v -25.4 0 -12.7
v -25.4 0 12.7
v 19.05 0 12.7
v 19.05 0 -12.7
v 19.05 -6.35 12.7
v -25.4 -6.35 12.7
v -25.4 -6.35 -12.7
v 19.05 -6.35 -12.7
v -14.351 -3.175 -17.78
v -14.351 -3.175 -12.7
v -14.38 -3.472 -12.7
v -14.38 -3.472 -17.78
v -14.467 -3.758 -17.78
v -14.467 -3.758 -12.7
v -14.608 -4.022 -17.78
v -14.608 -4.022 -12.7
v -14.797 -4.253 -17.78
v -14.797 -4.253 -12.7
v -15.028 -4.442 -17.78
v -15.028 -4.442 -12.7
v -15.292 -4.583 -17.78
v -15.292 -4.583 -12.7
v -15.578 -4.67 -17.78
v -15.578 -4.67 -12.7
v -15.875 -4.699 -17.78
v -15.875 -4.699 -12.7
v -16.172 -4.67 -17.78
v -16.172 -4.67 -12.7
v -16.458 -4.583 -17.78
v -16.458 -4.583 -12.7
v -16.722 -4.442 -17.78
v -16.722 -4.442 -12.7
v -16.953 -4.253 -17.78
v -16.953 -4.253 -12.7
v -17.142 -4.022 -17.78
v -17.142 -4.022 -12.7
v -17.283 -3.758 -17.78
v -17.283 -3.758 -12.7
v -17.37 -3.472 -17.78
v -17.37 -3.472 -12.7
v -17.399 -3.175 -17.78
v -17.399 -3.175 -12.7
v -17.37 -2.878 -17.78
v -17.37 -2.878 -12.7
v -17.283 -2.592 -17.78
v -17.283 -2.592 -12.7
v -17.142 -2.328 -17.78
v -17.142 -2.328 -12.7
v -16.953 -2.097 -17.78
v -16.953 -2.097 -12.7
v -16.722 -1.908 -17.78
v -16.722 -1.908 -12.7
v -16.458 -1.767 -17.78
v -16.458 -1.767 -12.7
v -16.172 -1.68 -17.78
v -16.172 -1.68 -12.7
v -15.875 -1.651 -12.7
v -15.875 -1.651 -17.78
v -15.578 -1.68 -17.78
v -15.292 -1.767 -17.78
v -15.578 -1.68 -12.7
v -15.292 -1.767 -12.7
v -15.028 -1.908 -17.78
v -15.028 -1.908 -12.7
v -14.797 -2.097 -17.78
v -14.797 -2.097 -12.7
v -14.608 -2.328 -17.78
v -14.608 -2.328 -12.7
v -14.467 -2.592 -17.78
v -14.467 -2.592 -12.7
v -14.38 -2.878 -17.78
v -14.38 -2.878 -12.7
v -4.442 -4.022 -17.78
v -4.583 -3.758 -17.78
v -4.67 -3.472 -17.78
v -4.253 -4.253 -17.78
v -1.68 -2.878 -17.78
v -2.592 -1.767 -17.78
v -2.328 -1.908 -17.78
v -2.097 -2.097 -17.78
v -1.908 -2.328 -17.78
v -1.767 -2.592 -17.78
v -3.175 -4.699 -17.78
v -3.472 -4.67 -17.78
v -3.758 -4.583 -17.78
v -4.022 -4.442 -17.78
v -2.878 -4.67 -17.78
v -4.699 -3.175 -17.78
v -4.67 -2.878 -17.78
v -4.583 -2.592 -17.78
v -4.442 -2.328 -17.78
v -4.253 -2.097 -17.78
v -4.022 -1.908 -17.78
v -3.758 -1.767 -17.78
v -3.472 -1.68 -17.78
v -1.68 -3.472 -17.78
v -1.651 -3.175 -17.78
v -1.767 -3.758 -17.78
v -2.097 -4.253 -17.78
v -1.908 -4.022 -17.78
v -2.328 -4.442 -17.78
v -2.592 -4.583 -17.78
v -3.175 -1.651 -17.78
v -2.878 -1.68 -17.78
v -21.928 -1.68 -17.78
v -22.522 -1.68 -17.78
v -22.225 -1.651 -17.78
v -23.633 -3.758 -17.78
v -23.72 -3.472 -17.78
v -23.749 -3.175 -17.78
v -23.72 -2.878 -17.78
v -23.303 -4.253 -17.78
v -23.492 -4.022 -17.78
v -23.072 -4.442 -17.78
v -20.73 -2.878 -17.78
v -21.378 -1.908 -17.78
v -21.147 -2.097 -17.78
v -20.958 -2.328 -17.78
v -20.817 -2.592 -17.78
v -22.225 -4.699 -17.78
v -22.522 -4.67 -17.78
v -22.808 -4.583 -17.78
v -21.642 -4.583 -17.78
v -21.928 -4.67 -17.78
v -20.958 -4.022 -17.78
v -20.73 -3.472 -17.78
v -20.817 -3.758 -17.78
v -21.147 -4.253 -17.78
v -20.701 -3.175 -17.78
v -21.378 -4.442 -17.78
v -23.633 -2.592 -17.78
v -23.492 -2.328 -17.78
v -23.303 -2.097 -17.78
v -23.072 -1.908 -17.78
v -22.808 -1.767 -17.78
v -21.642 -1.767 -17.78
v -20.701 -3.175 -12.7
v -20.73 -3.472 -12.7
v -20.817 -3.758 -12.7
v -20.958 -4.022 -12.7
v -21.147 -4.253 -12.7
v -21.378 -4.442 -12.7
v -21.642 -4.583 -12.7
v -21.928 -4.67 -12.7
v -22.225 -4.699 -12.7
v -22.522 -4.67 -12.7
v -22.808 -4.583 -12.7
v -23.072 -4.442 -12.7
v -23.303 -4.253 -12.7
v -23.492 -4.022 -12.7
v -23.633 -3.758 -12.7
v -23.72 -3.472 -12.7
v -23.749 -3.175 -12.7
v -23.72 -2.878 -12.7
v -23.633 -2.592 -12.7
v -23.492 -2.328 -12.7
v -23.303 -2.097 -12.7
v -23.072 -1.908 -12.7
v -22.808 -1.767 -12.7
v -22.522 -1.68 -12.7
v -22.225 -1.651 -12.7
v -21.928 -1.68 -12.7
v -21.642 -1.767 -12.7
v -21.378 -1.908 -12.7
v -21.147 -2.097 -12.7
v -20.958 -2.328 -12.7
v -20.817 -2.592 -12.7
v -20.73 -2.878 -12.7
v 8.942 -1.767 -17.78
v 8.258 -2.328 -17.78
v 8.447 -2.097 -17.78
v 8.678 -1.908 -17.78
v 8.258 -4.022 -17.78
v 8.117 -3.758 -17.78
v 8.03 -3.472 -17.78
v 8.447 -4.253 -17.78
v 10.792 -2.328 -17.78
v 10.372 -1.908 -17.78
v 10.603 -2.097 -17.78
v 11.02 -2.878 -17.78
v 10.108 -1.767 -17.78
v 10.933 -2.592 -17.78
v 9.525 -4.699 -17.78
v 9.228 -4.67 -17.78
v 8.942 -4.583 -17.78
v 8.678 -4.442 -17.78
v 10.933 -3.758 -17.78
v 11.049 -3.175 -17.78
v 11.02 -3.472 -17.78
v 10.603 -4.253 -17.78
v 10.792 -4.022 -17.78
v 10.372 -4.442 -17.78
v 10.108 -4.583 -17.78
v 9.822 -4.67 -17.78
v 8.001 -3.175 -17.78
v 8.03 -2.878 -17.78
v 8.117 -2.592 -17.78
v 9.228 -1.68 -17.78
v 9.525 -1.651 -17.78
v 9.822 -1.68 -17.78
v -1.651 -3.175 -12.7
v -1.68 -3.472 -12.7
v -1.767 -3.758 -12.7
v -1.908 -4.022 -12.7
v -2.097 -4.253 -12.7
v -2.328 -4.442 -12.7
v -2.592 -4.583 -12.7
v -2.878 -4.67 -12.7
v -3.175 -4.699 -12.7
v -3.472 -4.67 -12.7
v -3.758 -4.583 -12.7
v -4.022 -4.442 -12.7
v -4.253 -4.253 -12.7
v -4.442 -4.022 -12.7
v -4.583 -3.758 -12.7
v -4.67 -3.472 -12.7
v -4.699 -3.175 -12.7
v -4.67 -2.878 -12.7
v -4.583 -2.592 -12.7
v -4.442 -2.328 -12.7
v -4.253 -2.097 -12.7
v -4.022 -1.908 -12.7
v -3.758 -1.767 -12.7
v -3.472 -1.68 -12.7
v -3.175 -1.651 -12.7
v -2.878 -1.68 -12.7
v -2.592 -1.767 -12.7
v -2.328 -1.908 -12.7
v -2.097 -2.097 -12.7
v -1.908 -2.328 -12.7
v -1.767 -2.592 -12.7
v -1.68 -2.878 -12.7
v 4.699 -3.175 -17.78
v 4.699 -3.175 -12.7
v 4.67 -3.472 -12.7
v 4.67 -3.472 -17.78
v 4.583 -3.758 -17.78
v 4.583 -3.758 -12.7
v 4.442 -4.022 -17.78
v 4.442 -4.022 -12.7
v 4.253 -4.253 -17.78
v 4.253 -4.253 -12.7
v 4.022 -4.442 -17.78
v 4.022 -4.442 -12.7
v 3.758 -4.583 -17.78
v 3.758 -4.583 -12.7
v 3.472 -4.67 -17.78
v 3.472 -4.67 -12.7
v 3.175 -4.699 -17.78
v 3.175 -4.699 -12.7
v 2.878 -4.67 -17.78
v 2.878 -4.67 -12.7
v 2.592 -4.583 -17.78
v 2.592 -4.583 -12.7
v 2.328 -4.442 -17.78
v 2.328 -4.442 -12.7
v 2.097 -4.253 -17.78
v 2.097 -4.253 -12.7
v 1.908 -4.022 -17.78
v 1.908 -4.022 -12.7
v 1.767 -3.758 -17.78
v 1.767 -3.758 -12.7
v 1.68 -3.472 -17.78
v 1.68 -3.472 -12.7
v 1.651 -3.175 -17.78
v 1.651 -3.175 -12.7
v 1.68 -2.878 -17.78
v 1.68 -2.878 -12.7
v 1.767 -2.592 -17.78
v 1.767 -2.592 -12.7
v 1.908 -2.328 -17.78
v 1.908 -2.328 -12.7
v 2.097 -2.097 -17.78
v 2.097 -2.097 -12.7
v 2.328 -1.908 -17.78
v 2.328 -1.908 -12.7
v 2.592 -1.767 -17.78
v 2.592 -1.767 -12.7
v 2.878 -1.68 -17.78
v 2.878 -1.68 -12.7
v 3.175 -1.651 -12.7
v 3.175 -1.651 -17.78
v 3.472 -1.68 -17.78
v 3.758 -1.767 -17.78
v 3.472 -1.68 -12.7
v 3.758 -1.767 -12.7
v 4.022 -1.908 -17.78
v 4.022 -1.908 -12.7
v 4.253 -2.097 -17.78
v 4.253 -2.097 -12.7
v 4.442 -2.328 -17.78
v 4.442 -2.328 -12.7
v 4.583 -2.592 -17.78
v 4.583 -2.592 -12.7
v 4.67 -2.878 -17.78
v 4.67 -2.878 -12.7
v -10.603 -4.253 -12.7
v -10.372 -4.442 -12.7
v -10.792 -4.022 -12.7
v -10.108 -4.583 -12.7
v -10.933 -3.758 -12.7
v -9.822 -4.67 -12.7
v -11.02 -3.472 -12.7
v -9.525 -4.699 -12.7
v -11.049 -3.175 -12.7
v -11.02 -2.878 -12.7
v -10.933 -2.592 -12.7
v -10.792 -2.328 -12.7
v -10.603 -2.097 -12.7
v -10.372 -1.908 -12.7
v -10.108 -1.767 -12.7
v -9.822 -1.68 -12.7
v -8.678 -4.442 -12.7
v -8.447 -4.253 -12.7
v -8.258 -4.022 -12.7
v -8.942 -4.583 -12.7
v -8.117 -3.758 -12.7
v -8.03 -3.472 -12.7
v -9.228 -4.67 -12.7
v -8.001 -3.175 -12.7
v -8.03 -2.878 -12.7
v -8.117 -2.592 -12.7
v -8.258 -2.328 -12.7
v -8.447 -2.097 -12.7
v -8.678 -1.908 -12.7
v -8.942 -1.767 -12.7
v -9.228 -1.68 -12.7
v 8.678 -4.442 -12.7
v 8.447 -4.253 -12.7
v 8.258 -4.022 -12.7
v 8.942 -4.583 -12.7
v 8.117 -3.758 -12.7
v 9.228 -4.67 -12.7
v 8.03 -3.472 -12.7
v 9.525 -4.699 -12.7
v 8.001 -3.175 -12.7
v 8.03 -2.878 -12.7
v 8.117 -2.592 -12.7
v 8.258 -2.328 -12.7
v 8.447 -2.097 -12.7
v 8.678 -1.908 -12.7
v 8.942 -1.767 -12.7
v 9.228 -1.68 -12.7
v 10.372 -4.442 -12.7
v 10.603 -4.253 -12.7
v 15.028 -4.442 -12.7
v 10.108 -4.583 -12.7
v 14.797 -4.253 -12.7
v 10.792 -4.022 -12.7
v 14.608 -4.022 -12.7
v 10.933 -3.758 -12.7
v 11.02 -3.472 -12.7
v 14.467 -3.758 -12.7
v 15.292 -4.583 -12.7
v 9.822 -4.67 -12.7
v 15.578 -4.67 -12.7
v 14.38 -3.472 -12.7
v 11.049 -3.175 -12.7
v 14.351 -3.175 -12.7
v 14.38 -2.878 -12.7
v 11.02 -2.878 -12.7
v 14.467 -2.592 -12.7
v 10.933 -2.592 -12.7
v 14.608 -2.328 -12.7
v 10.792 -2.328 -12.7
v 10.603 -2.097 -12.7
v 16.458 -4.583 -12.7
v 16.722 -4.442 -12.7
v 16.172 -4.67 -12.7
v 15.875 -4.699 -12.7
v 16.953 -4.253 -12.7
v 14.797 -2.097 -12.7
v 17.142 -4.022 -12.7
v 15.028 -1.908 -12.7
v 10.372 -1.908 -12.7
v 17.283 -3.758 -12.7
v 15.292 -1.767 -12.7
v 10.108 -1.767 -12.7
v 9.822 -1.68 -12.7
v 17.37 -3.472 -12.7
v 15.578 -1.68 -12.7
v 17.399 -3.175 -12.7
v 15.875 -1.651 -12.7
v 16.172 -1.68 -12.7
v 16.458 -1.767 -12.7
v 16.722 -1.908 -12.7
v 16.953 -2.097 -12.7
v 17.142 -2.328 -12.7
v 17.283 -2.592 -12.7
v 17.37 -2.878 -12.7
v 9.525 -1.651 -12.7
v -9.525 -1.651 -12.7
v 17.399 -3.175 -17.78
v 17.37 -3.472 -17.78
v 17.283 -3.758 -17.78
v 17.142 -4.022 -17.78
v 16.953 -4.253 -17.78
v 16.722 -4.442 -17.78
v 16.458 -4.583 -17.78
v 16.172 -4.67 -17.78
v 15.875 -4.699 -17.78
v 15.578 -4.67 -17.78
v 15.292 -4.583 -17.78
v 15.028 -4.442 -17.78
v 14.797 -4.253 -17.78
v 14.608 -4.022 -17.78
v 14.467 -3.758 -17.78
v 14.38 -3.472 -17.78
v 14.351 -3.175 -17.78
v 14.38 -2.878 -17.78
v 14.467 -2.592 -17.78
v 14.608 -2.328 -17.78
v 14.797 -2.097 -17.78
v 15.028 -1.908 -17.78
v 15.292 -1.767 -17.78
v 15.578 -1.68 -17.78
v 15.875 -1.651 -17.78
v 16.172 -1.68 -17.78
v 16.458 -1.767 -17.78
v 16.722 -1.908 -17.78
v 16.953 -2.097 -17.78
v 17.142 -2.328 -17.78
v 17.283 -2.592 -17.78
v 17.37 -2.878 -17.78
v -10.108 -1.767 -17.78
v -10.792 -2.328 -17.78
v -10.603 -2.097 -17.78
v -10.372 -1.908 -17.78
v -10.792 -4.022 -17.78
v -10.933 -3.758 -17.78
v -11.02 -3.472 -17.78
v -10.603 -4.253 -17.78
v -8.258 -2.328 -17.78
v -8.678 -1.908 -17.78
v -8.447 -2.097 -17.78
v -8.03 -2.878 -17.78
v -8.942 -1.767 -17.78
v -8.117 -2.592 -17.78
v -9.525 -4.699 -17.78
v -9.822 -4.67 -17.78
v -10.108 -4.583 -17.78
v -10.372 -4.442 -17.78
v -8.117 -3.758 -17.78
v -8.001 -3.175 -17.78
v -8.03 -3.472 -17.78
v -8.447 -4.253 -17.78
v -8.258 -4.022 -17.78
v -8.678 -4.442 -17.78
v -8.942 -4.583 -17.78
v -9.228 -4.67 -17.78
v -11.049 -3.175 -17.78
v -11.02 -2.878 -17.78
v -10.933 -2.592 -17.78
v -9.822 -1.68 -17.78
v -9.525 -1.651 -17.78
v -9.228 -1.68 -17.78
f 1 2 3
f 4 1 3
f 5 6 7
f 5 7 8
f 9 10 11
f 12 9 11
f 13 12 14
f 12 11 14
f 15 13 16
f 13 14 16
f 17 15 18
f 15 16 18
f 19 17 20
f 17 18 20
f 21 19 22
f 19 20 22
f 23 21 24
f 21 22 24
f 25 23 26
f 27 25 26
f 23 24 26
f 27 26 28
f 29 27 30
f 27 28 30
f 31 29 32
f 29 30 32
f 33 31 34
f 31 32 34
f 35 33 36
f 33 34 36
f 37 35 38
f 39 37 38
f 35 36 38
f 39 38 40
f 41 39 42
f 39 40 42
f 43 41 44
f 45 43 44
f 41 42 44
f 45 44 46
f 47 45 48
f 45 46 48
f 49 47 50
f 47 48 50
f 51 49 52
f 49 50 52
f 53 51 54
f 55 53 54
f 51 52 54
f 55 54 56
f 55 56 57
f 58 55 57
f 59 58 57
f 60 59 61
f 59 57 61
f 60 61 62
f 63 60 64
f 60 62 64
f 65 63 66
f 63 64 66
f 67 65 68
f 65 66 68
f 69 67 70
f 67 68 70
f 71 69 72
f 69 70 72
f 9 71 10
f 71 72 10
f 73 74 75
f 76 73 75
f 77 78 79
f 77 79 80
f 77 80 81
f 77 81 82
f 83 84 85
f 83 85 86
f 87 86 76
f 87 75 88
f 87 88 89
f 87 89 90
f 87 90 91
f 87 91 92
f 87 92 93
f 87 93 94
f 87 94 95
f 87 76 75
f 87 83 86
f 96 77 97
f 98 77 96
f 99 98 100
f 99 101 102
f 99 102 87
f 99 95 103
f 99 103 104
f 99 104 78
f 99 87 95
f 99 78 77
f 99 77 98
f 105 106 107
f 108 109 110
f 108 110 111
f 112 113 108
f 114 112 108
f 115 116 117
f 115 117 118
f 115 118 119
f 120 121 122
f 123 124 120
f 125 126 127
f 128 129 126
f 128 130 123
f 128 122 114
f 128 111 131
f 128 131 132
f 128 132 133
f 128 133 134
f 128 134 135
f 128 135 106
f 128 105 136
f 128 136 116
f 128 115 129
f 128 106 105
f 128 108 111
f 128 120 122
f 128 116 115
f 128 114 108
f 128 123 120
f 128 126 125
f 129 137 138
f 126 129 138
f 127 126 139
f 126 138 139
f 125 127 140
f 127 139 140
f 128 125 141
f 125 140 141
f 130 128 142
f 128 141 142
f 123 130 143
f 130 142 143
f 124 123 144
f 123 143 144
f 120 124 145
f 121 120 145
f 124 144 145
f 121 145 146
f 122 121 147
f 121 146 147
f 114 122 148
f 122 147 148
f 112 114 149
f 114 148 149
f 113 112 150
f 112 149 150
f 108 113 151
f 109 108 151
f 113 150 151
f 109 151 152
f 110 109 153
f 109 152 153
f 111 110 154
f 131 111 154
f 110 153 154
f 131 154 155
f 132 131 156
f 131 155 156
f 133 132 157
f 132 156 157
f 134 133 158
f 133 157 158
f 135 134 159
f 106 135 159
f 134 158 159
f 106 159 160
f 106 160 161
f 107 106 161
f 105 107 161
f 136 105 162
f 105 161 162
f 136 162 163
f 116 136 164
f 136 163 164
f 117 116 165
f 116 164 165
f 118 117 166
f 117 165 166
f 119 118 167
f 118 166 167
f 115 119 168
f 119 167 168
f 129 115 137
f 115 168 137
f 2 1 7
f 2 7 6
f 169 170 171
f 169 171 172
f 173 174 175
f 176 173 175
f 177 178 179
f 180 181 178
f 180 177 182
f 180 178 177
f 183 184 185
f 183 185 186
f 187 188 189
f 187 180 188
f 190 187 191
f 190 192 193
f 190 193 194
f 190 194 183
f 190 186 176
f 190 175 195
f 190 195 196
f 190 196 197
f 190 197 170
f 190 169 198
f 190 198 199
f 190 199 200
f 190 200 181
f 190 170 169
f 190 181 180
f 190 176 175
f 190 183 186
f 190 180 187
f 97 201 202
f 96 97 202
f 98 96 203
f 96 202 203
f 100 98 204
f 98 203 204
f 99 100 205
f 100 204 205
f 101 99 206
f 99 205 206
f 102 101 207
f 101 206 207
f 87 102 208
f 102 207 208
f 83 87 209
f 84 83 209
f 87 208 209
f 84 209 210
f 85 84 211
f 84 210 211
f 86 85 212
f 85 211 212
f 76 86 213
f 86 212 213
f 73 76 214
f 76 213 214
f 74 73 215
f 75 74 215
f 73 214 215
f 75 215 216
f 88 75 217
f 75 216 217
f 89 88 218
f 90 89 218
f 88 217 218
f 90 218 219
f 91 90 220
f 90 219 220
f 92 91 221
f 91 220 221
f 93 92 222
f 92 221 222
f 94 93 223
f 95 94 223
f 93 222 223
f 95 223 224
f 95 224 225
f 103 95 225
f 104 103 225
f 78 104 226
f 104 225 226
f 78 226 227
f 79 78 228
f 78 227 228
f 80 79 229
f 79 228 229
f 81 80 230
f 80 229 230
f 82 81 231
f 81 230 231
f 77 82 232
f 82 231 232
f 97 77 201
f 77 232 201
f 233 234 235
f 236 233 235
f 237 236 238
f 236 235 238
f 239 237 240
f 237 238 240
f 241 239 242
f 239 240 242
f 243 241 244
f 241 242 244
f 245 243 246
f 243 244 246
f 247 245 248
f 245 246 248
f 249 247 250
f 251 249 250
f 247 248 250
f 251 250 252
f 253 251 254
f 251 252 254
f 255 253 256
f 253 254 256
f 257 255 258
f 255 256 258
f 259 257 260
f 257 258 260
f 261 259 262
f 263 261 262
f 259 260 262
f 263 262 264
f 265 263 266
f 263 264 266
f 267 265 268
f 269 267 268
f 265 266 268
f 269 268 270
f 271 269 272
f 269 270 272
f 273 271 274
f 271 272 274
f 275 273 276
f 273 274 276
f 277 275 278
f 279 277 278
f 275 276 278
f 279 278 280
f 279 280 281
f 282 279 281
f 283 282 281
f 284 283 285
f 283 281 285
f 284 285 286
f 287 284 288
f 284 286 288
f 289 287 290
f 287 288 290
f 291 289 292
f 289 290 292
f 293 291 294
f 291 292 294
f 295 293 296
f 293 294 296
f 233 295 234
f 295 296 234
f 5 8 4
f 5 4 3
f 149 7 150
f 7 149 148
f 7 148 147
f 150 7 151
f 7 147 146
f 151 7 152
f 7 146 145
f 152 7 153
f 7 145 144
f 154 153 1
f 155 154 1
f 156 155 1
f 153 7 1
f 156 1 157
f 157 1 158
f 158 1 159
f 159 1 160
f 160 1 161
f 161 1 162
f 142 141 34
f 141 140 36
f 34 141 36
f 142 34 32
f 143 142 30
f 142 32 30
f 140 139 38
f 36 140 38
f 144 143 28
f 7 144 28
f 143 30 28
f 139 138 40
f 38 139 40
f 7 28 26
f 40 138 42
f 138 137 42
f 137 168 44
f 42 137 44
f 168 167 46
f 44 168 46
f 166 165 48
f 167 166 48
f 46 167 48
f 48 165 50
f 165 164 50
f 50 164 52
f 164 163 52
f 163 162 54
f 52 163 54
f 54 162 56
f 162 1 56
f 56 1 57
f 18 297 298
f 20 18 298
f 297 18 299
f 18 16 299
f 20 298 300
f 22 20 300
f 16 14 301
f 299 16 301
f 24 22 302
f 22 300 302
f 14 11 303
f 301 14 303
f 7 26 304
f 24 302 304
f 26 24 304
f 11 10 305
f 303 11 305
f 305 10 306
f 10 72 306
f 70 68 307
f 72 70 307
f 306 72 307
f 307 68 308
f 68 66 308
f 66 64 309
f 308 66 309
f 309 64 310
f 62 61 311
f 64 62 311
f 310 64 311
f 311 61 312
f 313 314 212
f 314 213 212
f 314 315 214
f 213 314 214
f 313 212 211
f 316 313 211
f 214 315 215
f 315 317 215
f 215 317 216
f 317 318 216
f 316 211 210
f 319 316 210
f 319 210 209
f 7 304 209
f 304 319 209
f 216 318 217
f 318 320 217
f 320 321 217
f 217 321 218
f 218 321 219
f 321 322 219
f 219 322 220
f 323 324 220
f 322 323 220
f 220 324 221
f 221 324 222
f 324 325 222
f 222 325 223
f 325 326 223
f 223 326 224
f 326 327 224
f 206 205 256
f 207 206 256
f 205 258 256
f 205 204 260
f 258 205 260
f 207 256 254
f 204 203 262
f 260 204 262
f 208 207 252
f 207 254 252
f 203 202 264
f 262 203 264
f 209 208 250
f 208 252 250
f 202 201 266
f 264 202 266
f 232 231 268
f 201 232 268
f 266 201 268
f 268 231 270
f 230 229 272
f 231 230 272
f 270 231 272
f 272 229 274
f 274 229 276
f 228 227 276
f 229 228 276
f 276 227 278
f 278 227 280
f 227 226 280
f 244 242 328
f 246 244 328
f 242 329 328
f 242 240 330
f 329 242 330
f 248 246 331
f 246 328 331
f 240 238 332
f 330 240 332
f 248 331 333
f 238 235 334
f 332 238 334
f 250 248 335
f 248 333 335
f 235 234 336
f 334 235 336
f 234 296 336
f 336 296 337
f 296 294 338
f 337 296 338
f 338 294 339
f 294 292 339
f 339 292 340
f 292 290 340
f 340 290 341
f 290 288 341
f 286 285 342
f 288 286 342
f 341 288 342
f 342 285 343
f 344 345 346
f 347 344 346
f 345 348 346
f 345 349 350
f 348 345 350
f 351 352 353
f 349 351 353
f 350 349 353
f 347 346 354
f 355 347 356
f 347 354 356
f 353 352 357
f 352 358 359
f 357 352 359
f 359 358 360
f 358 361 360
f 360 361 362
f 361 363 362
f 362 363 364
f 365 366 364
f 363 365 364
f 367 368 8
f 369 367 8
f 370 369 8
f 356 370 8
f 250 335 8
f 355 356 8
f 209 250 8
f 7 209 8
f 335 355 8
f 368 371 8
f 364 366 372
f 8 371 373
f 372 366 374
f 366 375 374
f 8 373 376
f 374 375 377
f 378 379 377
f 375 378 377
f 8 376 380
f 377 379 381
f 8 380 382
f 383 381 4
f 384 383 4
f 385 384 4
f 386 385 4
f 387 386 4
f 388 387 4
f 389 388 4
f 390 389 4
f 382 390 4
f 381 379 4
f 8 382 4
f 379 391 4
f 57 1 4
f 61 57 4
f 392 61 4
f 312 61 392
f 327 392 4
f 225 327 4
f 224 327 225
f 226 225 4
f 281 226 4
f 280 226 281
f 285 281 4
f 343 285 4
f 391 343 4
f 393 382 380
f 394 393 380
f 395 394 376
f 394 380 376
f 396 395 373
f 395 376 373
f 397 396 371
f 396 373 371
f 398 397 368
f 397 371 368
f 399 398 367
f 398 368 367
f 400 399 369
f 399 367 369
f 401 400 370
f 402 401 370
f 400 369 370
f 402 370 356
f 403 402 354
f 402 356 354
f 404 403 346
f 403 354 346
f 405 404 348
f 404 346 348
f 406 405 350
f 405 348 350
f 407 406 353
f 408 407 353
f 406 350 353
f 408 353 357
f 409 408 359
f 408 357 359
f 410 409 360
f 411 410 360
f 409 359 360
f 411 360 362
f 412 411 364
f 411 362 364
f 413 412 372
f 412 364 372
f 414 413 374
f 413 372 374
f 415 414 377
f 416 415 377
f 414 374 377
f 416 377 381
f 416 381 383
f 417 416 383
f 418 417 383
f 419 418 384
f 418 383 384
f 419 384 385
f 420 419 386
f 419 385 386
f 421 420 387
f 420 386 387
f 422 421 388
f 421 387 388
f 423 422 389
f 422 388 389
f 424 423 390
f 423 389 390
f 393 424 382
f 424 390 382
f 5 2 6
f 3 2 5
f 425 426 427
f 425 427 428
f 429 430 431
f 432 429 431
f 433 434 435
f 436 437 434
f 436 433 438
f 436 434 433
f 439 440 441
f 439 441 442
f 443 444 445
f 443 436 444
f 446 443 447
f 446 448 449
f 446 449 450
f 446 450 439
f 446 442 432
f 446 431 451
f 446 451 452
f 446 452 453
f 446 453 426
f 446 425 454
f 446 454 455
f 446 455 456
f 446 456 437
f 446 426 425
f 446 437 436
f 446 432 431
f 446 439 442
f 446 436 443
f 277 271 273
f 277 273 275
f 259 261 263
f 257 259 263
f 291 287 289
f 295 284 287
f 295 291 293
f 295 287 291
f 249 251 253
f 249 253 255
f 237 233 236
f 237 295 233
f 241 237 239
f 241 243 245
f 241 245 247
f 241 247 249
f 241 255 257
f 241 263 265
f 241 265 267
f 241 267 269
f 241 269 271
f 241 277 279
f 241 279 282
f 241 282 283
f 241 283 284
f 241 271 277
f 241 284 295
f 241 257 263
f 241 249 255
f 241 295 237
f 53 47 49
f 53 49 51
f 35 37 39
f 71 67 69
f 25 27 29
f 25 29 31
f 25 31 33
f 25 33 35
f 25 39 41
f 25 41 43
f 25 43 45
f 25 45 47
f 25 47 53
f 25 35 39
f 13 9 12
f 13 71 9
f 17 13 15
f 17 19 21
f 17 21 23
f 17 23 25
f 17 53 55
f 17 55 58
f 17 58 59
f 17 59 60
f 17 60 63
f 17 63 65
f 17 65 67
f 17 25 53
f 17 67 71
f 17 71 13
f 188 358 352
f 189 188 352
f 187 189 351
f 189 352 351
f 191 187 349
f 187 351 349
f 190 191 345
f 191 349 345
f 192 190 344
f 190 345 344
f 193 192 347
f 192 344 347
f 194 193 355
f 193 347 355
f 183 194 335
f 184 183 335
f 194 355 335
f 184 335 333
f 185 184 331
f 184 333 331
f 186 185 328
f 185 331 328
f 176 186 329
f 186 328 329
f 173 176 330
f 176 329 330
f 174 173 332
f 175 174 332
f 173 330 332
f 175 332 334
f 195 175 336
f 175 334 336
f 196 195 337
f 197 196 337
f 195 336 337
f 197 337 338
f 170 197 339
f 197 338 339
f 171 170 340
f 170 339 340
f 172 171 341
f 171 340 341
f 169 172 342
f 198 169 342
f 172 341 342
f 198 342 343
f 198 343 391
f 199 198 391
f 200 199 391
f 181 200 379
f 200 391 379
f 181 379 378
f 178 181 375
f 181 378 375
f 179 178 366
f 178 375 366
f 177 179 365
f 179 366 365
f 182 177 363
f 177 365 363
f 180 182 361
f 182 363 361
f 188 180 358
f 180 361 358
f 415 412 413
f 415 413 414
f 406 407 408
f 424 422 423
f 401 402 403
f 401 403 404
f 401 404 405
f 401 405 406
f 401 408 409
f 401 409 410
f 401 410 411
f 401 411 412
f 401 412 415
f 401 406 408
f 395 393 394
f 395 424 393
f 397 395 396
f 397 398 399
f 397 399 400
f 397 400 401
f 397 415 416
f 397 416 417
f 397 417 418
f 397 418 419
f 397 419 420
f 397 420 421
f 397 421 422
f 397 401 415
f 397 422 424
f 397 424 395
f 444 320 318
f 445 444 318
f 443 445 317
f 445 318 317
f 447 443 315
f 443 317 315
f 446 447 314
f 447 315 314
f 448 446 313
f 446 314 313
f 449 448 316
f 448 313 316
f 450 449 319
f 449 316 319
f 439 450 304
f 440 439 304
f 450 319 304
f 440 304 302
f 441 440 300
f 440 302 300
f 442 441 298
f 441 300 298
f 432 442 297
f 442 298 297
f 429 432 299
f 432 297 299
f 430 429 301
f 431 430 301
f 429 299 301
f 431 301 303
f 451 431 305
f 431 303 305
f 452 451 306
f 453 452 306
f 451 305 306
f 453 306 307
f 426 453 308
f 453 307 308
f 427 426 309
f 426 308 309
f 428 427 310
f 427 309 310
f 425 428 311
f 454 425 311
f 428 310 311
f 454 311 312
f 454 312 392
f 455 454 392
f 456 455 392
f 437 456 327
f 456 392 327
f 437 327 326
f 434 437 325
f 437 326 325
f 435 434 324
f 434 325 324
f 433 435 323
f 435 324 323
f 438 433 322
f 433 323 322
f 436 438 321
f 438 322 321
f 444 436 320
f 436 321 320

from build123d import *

# Parameters (mm, degrees)
F0_W     = 50.8
F0_H     = 25.4
F1_DEPTH = 6.35
F2_R     = 1.524
F3_DEPTH = 5.08
F4_W     = 6.35
F4_H     = 61.243406
F5_DEPTH = 25.4


with BuildPart() as f1:
    # F0 (on Front) → F1 (new body)
    with BuildSketch(Plane.XZ):
        Rectangle(F0_W, F0_H)
    extrude(amount=F1_DEPTH)

    # F2 (on face) → F3 (join)
    with BuildSketch(Plane(origin=(0, 0, -12.7), x_dir=(1, 0, 0), z_dir=(0, 0, -1))):
        with BuildLine():
            ThreePointArc((-23.749, 3.175), (-22.225, 1.651), (-20.701, 3.175))
            ThreePointArc((-20.701, 3.175), (-22.225, 4.699), (-23.749, 3.175))
        make_face()
        with Locations((-15.875, 3.175)):
            Circle(F2_R)
        with Locations((-9.525, 3.175)):
            Circle(F2_R)
        with Locations((-3.175, 3.175)):
            Circle(F2_R)
        with Locations((3.175, 3.175)):
            Circle(F2_R)
        with Locations((9.525, 3.175)):
            Circle(F2_R)
        with Locations((15.875, 3.175)):
            Circle(F2_R)
        with Locations((22.225, 3.175)):
            Circle(F2_R)
    extrude(amount=F3_DEPTH)

    # F4 (on face) → F5 (cut)
    with BuildSketch(Plane.XZ.offset(6.35)):
        with Locations((22.225, -17.921703)):
            Rectangle(F4_W, F4_H)
    extrude(amount=-F5_DEPTH, mode=Mode.SUBTRACT)


solid = f1.part
